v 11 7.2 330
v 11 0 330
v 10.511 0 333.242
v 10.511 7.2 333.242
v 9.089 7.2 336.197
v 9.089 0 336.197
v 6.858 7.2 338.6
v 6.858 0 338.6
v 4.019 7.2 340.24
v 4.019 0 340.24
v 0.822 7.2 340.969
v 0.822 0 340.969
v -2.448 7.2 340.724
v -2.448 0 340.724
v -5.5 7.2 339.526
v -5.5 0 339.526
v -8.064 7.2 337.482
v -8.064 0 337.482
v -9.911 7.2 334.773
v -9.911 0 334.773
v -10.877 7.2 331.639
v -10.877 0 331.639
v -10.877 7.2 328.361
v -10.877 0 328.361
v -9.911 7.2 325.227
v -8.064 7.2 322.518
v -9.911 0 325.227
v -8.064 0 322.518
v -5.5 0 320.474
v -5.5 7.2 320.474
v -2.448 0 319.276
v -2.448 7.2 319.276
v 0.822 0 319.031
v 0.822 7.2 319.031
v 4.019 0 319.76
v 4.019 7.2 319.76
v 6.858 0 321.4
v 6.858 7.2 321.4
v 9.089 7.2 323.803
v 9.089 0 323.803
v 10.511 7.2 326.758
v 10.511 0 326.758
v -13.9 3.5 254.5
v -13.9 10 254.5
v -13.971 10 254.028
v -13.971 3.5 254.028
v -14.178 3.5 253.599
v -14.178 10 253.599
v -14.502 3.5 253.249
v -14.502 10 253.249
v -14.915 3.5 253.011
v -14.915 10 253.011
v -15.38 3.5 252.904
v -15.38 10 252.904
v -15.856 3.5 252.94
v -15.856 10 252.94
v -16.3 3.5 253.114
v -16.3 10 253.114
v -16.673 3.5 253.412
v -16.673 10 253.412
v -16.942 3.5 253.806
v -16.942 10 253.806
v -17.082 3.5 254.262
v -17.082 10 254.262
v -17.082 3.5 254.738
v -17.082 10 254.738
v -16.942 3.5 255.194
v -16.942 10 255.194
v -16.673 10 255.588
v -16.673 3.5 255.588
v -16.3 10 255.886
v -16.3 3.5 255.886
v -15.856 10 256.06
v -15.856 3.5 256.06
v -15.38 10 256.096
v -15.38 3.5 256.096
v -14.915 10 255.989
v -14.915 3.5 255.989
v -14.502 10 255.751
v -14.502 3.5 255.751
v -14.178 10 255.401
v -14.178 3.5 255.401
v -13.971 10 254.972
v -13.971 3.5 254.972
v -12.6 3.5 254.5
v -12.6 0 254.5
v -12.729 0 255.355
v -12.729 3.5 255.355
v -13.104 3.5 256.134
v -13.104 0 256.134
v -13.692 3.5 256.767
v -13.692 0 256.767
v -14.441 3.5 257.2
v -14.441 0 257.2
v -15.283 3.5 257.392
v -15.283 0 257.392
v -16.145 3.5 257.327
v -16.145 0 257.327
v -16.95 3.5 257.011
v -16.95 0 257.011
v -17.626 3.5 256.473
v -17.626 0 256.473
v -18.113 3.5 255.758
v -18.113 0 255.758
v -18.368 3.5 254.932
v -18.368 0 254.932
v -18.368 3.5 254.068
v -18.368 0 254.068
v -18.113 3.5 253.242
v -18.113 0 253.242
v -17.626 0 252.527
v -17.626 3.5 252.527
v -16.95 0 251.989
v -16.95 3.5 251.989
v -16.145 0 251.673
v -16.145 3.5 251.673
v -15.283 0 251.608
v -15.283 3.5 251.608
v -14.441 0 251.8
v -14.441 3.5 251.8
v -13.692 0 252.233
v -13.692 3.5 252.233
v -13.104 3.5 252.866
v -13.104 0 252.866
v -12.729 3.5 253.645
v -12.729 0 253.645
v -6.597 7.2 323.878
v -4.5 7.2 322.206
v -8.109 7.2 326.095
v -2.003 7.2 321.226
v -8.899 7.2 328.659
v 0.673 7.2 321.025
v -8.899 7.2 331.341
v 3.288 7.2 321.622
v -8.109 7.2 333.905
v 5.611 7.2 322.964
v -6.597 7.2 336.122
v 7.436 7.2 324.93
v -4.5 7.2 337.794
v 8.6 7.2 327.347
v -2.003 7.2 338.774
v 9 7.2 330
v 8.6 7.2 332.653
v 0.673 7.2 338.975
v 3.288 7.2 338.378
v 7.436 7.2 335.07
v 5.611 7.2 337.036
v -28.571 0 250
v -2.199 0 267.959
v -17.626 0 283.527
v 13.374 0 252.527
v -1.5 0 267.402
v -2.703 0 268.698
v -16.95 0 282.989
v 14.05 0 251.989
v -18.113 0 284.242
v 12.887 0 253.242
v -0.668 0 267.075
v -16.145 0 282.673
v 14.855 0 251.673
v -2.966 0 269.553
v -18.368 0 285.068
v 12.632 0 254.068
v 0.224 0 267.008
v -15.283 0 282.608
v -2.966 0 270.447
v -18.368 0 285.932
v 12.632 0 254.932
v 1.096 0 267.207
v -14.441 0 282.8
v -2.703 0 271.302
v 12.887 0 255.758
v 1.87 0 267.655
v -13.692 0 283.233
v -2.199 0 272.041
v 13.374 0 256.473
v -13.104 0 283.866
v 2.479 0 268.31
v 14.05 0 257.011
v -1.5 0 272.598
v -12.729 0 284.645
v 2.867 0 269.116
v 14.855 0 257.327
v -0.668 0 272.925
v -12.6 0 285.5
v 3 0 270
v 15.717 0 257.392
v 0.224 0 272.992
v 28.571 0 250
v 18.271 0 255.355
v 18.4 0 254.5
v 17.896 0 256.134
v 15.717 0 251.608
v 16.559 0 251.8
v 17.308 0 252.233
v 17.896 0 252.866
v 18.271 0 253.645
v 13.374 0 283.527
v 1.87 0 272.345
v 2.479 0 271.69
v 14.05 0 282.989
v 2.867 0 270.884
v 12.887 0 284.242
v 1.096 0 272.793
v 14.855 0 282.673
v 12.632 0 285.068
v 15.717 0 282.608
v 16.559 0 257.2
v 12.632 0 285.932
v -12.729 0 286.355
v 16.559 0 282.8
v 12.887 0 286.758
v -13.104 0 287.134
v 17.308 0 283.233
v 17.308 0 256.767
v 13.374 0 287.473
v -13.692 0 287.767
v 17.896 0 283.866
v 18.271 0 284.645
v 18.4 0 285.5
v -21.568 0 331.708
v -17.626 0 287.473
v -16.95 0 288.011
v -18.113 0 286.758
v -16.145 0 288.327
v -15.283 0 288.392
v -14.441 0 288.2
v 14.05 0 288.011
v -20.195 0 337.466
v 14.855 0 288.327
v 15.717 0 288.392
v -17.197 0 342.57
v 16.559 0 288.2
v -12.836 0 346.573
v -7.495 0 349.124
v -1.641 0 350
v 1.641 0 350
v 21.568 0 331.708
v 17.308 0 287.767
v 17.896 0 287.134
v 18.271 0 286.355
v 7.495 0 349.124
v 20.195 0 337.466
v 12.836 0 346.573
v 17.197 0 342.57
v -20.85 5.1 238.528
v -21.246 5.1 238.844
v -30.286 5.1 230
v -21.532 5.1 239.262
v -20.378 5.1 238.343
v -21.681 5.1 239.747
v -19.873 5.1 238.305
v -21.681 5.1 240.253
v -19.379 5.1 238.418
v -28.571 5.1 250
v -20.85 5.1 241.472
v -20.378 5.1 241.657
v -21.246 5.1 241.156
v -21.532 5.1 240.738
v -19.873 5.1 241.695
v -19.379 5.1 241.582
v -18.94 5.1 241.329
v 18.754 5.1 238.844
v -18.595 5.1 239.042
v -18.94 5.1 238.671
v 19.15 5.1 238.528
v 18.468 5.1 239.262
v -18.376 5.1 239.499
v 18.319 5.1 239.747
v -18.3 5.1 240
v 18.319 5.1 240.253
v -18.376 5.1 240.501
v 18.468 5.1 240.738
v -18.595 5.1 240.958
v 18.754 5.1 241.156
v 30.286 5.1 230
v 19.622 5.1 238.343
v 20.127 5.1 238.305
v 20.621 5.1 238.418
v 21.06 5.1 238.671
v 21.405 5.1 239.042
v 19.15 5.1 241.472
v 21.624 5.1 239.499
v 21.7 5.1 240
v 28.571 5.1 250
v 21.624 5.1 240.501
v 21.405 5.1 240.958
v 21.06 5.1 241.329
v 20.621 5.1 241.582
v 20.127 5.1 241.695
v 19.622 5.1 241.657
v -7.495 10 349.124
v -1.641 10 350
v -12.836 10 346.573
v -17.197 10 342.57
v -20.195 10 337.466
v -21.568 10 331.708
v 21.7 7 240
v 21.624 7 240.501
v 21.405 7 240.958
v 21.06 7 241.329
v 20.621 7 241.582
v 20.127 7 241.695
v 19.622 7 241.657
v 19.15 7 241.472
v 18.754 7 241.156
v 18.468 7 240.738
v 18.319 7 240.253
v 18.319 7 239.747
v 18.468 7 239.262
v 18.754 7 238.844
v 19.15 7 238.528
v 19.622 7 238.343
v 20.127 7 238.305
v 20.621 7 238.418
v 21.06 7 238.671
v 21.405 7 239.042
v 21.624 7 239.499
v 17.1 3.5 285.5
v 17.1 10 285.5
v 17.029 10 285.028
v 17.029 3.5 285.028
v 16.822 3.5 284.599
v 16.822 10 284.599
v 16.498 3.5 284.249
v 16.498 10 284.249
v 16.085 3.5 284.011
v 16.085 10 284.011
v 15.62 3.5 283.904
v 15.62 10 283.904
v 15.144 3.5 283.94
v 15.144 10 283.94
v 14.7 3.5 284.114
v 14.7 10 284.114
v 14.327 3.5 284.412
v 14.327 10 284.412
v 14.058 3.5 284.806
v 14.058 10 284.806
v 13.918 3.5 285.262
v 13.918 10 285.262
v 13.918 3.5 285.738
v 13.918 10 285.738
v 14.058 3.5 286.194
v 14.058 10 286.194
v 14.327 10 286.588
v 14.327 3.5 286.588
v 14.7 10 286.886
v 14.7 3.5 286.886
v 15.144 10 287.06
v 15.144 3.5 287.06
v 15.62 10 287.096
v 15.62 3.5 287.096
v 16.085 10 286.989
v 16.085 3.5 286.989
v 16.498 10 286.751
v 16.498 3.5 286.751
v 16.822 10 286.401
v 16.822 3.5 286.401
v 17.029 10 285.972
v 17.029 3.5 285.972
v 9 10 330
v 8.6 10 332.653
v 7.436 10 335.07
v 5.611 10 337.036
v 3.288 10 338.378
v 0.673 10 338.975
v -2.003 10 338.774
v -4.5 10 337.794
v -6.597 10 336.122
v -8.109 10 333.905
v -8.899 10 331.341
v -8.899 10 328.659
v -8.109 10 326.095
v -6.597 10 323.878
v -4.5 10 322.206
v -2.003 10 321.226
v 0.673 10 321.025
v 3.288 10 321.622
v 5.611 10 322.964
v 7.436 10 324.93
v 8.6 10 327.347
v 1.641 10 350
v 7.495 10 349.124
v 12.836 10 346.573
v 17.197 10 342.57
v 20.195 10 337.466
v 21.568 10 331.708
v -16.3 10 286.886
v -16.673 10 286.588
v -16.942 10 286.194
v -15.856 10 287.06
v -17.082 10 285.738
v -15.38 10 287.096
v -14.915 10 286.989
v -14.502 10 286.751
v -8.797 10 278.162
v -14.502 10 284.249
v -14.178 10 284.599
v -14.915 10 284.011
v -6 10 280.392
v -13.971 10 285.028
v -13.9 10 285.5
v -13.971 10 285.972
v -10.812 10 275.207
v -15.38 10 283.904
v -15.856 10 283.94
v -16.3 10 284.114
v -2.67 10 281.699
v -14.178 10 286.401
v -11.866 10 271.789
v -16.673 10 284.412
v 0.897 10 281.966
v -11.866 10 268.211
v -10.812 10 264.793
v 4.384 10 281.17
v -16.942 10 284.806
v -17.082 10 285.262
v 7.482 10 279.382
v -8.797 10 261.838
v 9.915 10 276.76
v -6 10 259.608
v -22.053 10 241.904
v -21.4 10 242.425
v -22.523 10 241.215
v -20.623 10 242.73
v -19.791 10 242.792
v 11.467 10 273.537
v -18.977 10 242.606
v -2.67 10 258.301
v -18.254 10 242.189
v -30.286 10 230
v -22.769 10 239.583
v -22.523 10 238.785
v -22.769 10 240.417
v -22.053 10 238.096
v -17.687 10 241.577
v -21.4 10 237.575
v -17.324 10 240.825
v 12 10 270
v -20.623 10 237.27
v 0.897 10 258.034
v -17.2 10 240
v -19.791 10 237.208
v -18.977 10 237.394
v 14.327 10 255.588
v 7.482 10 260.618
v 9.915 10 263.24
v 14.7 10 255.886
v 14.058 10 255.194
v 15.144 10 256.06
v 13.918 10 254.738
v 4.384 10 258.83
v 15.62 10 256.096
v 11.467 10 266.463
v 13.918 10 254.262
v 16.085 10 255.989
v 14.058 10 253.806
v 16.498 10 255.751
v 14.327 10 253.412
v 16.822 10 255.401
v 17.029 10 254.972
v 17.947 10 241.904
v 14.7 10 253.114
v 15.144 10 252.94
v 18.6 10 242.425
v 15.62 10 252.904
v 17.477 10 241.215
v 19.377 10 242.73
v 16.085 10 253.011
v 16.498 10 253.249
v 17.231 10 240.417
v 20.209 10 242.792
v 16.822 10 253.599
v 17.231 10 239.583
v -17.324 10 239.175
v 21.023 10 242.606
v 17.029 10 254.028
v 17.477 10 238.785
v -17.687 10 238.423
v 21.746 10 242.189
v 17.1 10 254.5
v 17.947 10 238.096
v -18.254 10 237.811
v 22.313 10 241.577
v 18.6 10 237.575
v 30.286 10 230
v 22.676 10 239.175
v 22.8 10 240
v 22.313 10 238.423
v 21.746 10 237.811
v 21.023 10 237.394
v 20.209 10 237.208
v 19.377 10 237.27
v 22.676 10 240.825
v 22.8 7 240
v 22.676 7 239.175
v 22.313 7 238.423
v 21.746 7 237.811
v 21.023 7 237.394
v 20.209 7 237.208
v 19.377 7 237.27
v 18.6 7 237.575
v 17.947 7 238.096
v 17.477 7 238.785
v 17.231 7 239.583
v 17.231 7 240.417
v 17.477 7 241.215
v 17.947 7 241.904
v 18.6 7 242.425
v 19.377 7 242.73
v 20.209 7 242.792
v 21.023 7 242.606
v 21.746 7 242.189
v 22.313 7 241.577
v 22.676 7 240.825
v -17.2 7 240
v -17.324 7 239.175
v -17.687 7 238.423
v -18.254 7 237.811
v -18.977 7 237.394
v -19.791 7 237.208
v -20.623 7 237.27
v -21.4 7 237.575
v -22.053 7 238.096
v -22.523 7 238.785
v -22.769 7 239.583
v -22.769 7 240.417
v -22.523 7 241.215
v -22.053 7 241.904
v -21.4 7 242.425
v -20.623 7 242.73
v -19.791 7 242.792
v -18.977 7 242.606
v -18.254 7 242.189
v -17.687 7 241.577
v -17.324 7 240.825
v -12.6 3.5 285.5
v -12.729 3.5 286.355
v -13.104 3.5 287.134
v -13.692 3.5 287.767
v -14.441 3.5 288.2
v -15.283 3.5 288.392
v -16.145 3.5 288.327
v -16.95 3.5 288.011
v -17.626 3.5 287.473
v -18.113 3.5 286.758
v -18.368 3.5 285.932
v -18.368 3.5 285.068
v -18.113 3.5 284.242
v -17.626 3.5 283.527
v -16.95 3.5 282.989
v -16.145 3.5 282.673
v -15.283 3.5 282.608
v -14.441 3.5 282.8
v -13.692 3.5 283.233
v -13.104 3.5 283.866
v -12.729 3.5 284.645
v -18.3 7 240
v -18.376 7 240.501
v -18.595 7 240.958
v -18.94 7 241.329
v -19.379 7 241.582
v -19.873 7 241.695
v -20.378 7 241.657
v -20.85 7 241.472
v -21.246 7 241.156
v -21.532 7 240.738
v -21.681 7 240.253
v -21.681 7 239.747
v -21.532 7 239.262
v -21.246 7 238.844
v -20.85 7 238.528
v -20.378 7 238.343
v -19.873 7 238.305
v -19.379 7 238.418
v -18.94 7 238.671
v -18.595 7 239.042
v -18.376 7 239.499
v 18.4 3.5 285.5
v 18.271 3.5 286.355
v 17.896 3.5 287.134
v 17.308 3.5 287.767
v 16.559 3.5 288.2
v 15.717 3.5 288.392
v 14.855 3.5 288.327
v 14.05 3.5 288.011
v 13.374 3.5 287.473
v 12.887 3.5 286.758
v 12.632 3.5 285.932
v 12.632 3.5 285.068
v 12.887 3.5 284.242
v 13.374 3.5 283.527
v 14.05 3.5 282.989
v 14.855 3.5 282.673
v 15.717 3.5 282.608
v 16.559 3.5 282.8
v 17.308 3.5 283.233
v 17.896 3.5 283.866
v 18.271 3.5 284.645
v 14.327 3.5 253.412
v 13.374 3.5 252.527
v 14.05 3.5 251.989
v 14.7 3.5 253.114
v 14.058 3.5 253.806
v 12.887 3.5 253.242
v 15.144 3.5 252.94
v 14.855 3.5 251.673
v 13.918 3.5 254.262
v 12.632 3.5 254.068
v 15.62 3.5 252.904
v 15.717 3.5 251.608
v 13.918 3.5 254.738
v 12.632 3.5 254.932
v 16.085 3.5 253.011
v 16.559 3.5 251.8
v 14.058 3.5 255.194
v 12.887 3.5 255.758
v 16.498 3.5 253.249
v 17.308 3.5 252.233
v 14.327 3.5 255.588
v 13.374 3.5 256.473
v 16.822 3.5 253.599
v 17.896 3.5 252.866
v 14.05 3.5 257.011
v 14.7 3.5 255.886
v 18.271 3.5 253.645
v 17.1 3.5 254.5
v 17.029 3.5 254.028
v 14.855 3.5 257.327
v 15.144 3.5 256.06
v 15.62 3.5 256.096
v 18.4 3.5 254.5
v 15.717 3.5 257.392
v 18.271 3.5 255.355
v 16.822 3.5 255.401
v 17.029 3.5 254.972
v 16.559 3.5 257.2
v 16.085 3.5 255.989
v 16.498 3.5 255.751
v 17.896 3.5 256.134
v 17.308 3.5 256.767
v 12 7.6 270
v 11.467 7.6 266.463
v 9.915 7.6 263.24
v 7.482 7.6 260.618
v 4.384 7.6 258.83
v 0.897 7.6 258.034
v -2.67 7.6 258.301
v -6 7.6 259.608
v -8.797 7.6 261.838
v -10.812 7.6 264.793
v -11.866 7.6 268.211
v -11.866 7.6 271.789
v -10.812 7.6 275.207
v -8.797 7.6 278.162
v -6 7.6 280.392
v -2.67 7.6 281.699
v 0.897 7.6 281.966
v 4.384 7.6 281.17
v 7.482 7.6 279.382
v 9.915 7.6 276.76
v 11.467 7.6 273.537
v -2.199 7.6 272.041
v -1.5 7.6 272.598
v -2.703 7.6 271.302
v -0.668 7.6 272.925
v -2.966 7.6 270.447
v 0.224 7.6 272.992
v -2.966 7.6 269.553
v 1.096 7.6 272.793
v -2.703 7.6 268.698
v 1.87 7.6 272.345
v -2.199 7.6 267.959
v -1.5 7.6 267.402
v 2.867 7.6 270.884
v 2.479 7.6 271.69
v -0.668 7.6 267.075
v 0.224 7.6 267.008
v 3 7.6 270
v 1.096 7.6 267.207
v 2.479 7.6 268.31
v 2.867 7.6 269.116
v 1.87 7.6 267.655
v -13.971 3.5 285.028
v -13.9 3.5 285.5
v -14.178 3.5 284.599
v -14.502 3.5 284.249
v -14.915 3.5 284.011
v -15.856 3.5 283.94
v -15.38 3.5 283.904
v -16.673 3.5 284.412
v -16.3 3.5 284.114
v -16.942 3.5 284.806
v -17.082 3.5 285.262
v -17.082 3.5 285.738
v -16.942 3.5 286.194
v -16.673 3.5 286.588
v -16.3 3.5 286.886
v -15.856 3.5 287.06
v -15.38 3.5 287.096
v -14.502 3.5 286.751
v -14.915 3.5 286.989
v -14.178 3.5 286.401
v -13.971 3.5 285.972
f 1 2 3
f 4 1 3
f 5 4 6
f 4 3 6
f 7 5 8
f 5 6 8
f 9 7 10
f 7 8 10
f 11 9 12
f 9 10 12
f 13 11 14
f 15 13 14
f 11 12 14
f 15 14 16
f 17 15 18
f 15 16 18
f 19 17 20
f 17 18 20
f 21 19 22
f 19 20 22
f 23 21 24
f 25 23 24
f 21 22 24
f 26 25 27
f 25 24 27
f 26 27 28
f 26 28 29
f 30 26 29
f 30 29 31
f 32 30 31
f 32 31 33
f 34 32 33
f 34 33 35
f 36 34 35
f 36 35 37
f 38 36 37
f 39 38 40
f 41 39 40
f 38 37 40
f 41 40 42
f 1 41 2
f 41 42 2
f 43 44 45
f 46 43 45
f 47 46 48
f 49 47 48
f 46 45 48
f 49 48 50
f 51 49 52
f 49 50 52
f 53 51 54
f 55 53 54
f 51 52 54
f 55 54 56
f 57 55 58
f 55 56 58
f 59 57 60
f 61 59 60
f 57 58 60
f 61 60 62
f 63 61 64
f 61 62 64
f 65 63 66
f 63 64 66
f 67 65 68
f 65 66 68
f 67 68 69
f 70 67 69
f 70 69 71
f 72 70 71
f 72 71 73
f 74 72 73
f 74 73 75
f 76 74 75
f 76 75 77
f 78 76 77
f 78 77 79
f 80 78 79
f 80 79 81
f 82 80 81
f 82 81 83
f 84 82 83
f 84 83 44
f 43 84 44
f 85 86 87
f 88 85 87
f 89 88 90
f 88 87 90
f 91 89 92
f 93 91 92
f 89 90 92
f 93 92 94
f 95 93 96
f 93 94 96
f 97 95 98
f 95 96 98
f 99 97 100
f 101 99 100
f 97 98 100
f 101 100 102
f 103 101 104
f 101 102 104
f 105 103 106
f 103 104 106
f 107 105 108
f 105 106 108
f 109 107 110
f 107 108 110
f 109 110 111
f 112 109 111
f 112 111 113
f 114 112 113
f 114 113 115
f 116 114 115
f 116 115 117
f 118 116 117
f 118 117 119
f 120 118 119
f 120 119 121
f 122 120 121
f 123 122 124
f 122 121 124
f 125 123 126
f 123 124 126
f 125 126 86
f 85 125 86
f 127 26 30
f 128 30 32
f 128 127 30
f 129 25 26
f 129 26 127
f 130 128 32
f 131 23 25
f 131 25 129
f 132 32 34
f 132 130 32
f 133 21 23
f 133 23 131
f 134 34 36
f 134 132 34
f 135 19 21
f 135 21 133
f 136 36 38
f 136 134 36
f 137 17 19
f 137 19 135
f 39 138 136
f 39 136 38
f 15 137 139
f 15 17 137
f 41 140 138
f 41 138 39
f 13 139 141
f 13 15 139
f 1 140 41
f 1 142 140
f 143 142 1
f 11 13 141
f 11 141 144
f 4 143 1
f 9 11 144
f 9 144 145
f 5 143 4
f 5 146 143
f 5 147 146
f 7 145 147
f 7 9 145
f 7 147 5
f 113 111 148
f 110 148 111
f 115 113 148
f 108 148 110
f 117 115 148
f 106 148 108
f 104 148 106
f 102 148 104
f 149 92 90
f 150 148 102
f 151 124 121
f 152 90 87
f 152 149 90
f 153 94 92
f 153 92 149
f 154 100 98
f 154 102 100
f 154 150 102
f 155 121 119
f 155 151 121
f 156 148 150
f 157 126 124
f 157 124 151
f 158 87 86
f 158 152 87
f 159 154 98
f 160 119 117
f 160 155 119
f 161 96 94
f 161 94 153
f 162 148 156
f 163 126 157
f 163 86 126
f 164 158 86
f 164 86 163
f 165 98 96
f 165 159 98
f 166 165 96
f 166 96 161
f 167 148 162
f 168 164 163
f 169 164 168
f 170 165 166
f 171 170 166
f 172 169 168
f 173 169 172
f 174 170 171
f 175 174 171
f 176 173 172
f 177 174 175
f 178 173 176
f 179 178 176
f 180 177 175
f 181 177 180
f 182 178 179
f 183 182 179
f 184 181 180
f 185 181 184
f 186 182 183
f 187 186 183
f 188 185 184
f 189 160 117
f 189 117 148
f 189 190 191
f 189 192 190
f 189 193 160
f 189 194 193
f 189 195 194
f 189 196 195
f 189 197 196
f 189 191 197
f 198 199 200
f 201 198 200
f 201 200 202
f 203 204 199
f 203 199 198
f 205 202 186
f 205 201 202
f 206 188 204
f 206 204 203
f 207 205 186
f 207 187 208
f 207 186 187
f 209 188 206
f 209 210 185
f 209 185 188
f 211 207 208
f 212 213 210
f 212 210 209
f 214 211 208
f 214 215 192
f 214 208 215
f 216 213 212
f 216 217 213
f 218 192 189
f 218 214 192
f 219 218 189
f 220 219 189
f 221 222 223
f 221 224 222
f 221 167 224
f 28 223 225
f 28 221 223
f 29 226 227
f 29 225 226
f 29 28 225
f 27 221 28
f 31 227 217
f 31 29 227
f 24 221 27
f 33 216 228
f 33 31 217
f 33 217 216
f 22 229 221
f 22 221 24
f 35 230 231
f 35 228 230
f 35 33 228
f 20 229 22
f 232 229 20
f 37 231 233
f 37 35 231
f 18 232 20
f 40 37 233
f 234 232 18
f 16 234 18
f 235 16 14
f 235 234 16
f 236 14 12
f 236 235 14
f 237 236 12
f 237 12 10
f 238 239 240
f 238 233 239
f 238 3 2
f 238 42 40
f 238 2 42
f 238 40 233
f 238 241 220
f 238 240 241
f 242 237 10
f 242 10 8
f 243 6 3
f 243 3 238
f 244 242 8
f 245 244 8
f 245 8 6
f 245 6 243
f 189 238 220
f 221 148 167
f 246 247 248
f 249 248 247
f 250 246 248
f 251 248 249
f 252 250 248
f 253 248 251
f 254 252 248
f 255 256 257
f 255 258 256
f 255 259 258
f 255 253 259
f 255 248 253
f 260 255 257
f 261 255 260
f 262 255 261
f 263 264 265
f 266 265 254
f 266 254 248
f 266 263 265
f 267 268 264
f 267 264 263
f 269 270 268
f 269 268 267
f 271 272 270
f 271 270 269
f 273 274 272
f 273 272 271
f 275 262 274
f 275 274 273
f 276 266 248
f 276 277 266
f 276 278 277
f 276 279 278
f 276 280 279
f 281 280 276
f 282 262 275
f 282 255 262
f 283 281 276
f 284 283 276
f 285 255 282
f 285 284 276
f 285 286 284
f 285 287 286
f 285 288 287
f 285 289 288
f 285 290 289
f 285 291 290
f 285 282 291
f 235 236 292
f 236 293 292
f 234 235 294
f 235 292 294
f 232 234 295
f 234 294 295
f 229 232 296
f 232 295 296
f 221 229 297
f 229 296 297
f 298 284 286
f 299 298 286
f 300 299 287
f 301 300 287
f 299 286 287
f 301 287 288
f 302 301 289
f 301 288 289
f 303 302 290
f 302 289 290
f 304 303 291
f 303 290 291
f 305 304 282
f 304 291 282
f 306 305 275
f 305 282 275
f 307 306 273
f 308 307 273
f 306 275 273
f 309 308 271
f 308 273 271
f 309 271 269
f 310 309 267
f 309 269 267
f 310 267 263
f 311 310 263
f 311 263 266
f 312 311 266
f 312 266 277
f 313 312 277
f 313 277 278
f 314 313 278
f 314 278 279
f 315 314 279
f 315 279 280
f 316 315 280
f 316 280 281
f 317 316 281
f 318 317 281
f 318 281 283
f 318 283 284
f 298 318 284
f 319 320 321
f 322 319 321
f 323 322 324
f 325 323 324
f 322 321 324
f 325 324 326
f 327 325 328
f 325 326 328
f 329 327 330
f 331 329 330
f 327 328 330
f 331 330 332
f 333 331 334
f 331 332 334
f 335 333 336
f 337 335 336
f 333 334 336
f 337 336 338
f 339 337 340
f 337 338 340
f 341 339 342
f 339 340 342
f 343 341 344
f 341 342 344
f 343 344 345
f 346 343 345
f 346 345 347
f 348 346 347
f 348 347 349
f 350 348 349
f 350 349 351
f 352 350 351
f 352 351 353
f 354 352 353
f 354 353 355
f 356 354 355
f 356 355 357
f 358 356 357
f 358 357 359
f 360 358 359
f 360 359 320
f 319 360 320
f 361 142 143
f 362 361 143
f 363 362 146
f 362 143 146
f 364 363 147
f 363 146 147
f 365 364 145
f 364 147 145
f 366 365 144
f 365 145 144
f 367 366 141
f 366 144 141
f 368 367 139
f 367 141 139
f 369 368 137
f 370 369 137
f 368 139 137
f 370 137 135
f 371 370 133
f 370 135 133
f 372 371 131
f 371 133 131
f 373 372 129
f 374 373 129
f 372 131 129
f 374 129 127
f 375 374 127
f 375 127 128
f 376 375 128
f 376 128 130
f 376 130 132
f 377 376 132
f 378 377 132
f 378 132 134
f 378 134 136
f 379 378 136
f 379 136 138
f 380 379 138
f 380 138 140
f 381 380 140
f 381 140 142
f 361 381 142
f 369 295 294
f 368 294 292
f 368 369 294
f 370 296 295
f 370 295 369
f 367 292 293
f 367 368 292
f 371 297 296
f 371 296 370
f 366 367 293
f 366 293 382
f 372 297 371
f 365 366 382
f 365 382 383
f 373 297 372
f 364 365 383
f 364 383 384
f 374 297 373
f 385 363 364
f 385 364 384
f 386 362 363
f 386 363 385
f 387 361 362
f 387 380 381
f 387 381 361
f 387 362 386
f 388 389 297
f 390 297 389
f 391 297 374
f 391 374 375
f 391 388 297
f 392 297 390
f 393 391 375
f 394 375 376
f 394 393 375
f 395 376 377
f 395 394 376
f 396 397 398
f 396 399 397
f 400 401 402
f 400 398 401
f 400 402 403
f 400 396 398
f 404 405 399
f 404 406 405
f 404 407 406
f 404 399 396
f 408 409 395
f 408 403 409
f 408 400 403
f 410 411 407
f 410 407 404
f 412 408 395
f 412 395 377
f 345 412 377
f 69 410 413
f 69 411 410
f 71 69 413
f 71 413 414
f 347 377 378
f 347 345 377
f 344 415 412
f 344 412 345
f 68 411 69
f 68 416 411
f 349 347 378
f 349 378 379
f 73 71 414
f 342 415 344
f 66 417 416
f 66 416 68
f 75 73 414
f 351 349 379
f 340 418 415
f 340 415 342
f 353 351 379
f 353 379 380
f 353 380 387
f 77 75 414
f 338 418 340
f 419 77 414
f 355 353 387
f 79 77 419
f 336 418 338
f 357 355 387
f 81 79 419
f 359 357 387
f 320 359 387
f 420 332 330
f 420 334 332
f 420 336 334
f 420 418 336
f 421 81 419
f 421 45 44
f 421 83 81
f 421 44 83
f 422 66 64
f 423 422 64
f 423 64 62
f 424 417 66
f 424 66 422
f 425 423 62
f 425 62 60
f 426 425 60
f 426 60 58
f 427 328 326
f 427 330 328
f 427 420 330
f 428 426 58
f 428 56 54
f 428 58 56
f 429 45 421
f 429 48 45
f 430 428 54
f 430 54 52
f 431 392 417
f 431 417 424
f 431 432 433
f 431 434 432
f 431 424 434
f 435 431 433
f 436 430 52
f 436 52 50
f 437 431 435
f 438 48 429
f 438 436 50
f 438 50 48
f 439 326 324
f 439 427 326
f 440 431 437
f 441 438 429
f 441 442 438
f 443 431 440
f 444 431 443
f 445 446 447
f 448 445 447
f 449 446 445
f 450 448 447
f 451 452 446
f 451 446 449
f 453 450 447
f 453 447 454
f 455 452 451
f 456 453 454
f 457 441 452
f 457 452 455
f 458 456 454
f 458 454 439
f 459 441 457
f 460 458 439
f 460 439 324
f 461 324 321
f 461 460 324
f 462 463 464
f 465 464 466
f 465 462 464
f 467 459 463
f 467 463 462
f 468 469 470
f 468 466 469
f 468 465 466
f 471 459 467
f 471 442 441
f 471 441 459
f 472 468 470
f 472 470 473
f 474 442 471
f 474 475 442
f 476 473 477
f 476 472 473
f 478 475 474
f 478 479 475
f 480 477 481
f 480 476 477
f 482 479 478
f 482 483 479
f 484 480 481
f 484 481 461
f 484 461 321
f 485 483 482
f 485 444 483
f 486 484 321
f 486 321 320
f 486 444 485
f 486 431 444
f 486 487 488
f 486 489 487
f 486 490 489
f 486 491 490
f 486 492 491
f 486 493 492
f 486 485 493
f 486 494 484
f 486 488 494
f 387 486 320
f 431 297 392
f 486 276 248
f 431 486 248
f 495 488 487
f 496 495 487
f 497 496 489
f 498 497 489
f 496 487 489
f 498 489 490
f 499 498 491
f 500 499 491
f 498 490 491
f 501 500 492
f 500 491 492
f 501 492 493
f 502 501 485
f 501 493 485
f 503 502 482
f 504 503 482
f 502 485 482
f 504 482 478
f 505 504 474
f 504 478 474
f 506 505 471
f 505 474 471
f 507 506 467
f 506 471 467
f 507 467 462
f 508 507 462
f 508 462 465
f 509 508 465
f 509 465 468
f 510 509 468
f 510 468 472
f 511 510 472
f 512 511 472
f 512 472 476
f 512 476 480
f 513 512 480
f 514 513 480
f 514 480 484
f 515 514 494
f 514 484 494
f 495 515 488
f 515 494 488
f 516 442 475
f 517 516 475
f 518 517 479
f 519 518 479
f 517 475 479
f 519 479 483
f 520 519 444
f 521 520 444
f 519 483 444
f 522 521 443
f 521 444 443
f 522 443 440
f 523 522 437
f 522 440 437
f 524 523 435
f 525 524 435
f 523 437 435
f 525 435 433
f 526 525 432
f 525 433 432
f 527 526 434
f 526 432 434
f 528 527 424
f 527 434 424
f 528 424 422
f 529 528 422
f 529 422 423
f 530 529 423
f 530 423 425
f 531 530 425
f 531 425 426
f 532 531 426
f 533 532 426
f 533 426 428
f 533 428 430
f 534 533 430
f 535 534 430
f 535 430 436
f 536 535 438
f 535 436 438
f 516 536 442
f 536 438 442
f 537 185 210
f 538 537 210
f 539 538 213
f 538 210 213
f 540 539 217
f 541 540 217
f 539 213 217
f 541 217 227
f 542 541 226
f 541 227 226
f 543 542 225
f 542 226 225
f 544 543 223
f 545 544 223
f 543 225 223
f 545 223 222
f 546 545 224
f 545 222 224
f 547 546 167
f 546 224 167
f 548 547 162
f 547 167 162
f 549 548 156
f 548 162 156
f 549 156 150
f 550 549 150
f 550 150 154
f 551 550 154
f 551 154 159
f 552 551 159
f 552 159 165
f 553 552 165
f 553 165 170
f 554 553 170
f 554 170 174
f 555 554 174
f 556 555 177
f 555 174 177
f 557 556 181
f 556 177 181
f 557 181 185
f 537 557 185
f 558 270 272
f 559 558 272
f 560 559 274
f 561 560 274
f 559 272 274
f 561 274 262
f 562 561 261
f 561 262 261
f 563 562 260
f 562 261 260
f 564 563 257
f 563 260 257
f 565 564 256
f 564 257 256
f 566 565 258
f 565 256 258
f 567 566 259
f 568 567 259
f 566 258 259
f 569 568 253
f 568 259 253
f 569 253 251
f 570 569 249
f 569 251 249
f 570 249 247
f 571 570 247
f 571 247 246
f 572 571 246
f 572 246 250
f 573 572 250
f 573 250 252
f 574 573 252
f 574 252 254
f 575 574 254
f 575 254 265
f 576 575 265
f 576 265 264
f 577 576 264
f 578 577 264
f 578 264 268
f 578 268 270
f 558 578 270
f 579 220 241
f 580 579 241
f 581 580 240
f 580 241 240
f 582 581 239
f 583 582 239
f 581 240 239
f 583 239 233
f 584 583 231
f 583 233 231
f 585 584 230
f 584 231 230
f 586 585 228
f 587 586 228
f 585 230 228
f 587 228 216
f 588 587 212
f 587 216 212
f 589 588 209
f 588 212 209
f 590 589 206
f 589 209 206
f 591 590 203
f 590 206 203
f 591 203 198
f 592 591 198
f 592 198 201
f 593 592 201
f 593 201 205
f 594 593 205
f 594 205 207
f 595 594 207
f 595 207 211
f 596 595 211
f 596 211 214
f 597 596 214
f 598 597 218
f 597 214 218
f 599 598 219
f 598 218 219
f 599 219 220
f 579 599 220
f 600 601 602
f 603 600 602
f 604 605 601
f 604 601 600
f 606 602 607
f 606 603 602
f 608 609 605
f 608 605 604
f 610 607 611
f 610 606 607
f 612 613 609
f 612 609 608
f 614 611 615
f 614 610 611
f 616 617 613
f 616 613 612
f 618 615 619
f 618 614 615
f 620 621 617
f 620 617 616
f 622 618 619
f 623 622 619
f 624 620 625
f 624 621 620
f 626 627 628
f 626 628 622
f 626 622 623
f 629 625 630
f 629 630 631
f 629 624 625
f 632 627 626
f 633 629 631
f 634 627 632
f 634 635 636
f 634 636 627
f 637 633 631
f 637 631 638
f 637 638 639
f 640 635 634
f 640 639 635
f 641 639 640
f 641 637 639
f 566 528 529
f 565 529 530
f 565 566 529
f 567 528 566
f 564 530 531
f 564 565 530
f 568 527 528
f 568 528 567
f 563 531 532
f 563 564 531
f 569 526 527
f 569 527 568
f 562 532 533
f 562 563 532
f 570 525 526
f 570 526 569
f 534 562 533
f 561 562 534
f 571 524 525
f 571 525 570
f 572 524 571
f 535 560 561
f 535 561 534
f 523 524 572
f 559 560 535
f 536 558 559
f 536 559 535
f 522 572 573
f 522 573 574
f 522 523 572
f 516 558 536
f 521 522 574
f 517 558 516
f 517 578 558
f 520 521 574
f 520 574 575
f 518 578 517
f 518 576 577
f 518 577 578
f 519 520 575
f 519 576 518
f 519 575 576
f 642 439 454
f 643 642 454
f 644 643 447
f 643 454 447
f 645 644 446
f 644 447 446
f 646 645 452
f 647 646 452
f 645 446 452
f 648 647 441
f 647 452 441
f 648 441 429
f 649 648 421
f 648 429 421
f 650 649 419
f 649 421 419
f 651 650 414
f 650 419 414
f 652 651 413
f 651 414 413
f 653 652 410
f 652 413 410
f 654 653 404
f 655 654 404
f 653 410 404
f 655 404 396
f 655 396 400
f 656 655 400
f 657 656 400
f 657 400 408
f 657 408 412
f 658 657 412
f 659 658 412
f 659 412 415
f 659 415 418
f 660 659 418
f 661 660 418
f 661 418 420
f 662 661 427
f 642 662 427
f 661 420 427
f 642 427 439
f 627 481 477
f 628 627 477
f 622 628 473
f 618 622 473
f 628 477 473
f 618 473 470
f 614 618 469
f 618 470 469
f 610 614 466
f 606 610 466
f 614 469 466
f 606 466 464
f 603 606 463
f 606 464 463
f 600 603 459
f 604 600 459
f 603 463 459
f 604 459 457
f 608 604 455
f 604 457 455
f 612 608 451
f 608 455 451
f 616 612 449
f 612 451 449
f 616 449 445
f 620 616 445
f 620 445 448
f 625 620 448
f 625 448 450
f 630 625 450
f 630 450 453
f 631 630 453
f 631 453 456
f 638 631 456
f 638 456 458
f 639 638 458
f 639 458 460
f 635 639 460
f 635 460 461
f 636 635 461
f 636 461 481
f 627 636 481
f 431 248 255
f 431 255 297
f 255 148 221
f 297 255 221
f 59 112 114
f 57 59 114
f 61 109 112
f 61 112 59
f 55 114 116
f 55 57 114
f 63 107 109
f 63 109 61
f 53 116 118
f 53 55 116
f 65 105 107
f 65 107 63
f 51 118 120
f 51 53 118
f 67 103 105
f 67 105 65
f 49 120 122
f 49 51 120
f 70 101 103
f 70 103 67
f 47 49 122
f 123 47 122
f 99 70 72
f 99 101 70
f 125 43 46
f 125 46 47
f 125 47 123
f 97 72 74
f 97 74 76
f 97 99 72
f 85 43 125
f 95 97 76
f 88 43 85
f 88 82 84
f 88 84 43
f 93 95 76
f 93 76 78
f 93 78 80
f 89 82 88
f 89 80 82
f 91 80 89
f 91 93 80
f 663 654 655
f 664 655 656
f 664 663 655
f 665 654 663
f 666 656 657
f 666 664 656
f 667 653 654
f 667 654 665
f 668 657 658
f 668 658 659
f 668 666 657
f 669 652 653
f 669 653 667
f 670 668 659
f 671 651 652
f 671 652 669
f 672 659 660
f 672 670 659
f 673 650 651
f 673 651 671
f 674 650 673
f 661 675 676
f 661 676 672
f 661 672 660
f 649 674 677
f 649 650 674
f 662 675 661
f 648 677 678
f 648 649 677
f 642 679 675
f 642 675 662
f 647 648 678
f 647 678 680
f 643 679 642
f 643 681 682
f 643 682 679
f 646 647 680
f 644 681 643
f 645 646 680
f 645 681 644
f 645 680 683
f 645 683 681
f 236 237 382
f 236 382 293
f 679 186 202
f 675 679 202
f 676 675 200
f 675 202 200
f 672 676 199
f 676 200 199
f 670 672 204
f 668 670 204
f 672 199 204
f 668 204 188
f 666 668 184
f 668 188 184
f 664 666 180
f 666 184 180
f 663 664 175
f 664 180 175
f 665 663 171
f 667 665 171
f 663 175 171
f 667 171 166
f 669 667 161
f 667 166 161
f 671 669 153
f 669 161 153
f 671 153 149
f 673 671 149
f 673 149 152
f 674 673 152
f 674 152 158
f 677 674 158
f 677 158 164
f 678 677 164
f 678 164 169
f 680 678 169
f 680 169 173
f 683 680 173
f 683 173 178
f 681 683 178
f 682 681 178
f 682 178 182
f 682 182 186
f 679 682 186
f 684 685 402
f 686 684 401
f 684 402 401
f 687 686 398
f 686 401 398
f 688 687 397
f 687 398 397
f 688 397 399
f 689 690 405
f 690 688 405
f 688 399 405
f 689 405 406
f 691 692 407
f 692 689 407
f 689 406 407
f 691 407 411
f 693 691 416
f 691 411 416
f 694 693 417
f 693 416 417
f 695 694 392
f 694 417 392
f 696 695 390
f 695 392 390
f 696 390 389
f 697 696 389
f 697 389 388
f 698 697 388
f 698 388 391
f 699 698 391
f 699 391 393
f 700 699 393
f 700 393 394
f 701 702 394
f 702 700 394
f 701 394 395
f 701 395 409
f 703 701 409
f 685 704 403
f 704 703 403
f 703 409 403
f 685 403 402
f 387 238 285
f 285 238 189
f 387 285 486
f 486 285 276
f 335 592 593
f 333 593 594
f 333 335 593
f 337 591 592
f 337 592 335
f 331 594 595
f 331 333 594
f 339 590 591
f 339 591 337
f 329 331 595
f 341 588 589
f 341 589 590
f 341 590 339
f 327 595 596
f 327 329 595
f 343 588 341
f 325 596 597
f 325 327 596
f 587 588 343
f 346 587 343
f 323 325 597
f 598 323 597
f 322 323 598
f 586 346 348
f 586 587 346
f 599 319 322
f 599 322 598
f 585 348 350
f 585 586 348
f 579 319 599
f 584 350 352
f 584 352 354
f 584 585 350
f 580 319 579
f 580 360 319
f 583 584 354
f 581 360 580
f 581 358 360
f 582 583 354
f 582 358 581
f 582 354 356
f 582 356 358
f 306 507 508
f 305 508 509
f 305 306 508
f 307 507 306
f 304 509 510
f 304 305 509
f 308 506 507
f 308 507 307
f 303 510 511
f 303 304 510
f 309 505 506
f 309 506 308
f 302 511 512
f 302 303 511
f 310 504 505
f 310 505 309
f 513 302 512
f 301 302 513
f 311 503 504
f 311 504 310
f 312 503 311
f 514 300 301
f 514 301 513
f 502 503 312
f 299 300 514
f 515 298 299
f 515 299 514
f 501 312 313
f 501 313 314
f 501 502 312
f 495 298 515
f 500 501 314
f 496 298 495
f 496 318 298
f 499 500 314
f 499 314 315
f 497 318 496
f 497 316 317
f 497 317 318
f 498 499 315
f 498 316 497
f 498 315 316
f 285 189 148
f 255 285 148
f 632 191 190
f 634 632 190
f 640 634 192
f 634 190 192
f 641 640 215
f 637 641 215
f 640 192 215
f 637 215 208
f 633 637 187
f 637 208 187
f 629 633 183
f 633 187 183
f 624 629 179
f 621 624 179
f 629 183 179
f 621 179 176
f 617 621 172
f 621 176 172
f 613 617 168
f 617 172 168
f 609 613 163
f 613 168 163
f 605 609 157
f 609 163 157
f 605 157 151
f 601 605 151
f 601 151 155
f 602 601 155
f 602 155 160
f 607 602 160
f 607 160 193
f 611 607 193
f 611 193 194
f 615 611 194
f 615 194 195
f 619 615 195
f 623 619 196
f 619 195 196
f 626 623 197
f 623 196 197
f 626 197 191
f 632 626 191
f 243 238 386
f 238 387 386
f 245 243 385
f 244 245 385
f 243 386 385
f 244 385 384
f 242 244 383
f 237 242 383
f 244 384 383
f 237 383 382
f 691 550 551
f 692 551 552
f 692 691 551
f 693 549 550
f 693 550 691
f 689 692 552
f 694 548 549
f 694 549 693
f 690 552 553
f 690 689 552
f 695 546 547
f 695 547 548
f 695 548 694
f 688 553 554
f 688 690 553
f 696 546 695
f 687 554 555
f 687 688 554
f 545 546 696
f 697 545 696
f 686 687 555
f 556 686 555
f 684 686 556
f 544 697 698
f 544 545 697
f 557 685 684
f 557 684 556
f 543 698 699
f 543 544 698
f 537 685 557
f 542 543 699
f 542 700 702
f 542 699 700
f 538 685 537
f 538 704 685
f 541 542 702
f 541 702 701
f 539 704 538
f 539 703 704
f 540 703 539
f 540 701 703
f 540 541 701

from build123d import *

# Parameters (mm, degrees)
SKETCH1_R           = 50
BOSS_EXTRUDE1_DEPTH = 10
SKETCH2_R           = 20
CUT_EXTRUDE1_DEPTH  = 5
CUT_EXTRUDE6_DEPTH  = 3
SKETCH8_R           = 1.7
CUT_EXTRUDE7_DEPTH  = 10
BOSS_EXTRUDE3_DEPTH = 10
CUT_EXTRUDE11_DEPTH = 10
SKETCH15_W          = 131.735170003
SKETCH15_H          = 179.266555965
CUT_EXTRUDE12_DEPTH = 79
BOSS_EXTRUDE4_DEPTH = 4.9
SKETCH17_R          = 1.7
CUT_EXTRUDE13_DEPTH = 10
CUT_EXTRUDE14_DEPTH = 3
SKETCH19_W          = 78.571428572
SKETCH19_H          = 5.1
CUT_EXTRUDE15_DEPTH = 0.5
SKETCH21_W          = 92.115977302
SKETCH21_H          = 140.887390287
CUT_EXTRUDE16_DEPTH = 10
CUT_EXTRUDE17_DEPTH = 5.1
SKETCH24_R          = 1.7
CUT_EXTRUDE19_DEPTH = 5.1
SKETCH25_R          = 11
CUT_EXTRUDE20_DEPTH = 7.2
SKETCH26_R          = 9
CUT_EXTRUDE21_DEPTH = 7.2
SKETCH27_R          = 3
CUT_EXTRUDE22_DEPTH = 11
SKETCH28_R          = 1.6
CUT_EXTRUDE23_DEPTH = 12
SKETCH29_R          = 2.9
SKETCH29_R_2        = 1.6
CUT_EXTRUDE24_DEPTH = 3.5
SKETCH30_R          = 12
CUT_EXTRUDE25_DEPTH = 2.4
SKETCH31_R          = 2.8
CUT_EXTRUDE26_DEPTH = 3
FILLET1_R           = 20


with BuildPart() as part:
    # Sketch1 → Boss-Extrude1 (new body)
    with BuildSketch(Plane(origin=(0, 0, 0), x_dir=(1, 0, 0), z_dir=(0, 1, 0))):
        Circle(SKETCH1_R)
    extrude(amount=BOSS_EXTRUDE1_DEPTH)

    # Sketch2 → Cut-Extrude1 (cut)
    with BuildSketch(Plane(origin=(0, 10, 0), x_dir=(1, 0, 0), z_dir=(0, 1, 0))):
        Circle(SKETCH2_R)
    extrude(amount=-CUT_EXTRUDE1_DEPTH, mode=Mode.SUBTRACT)

    # Sketch7 → Cut-Extrude6 (cut)
    with BuildSketch(Plane.XZ):
        Polygon((12.990381057, -4.209103466), (10.140381057, -5.854551733), (10.140381057, -9.145448267), (12.990381057, -10.790896534), (15.840381057, -9.145448267), (15.840381057, -5.854551733), align=None)
        Polygon((-12.990381057, -4.209103466), (-15.840381057, -5.854551733), (-15.840381057, -9.145448267), (-12.990381057, -10.790896534), (-10.140381057, -9.145448267), (-10.140381057, -5.854551733), align=None)
        Polygon((-2.85, 16.645448267), (-2.85, 13.354551733), (0, 11.709103466), (2.85, 13.354551733), (2.85, 16.645448267), (0, 18.290896534), align=None)
    extrude(amount=-CUT_EXTRUDE6_DEPTH, mode=Mode.SUBTRACT)

    # Sketch8 → Cut-Extrude7 (cut)
    with BuildSketch(Plane.XZ):
        with Locations((0, 15)):
            Circle(SKETCH8_R)
        with Locations((12.990381057, -7.5)):
            Circle(SKETCH8_R)
        with Locations((-12.990381057, -7.5)):
            Circle(SKETCH8_R)
    extrude(amount=-CUT_EXTRUDE7_DEPTH, mode=Mode.SUBTRACT)


with BuildPart() as body_2:
    # Sketch9 → Boss-Extrude3 (new body)
    with BuildSketch(Plane.XZ):
        with BuildLine():
            Line((-50, 350), (-50, 0))
            ThreePointArc((-50, 0), (0, 50), (50, 0))
            Line((50, 0), (50, 350))
            Line((50, 350), (-50, 350))
        make_face()
    extrude(amount=-BOSS_EXTRUDE3_DEPTH)

    # Sketch13 → Cut-Extrude11 (cut)
    with BuildSketch(Plane.XZ):
        with BuildLine():
            Line((-50, 350), (-50, 0))
            ThreePointArc((-50, 0), (-49.817332452, 4.270057067), (-49.270664506, 8.5089141))
            Line((-49.270664506, 8.5089141), (-20, 350))
            Line((-20, 350), (-50, 350))
        make_face()
        with BuildLine():
            Line((20, 350), (49.270664506, 8.5089141))
            ThreePointArc((49.270664506, 8.5089141), (49.817332452, 4.270057067), (50, 0))
            Line((50, 0), (50, 350))
            Line((50, 350), (20, 350))
        make_face()
    extrude(amount=-CUT_EXTRUDE11_DEPTH, mode=Mode.SUBTRACT)


with BuildPart() as cut_extrude12_tool:
    # Sketch15 → Cut-Extrude12 (new body)
    with BuildSketch(Plane(origin=(0, 10, 0), x_dir=(1, 0, 0), z_dir=(0, 1, 0))):
        with Locations((-8.166136658, -35.366722018)):
            Rectangle(SKETCH15_W, SKETCH15_H)
    extrude(amount=-CUT_EXTRUDE12_DEPTH)


with BuildPart() as part_1:
    add(part.part)

    # Cut-Extrude12: cut by cut_extrude12_tool
    add(cut_extrude12_tool.part, mode=Mode.SUBTRACT)


with BuildPart() as body_2_1:
    add(body_2.part)

    # Cut-Extrude12: cut by cut_extrude12_tool
    add(cut_extrude12_tool.part, mode=Mode.SUBTRACT)

    # Sketch16 → Boss-Extrude4 (add)
    with BuildSketch(Plane(origin=(0, 10, 0), x_dir=(1, 0, 0), z_dir=(0, 1, 0))):
        Polygon((40.972386827, -105.322153681), (-40.972386827, -105.322153681), (-39.285714286, -125), (39.285714286, -125), align=None)
    extrude(amount=-BOSS_EXTRUDE4_DEPTH)

    # Sketch17 → Cut-Extrude13 (cut)
    with BuildSketch(Plane.XZ.offset(-5.1)):
        with Locations((-25, 115)):
            Circle(SKETCH17_R)
        with Locations((25, 115)):
            Circle(SKETCH17_R)
    extrude(amount=-CUT_EXTRUDE13_DEPTH, mode=Mode.SUBTRACT)

    # Sketch18 → Cut-Extrude14 (cut)
    with BuildSketch(Plane(origin=(0, 10, 0), x_dir=(1, 0, 0), z_dir=(0, 1, 0))):
        Polygon((-25, -111.651368439), (-27.9, -113.325684219), (-27.9, -116.674315781), (-25, -118.348631561), (-22.1, -116.674315781), (-22.1, -113.325684219), align=None)
        Polygon((22.1, -113.325684219), (25, -111.651368439), (27.9, -113.325684219), (27.9, -116.674315781), (25, -118.348631561), (22.1, -116.674315781), align=None)
    extrude(amount=-CUT_EXTRUDE14_DEPTH, mode=Mode.SUBTRACT)

    # Sketch19 → Cut-Extrude15 (cut)
    with BuildSketch(Plane(origin=(0, 0, 125), x_dir=(-1, 0, 0), z_dir=(0, 0, -1))):
        with Locations((0, 2.55)):
            Rectangle(SKETCH19_W, SKETCH19_H)
    extrude(amount=-CUT_EXTRUDE15_DEPTH, mode=Mode.SUBTRACT)

    # Sketch21 → Cut-Extrude16 (cut)
    with BuildSketch(Plane.XZ):
        with Locations((0.437891513, 159.556304857)):
            Rectangle(SKETCH21_W, SKETCH21_H)
    extrude(amount=-CUT_EXTRUDE16_DEPTH, mode=Mode.SUBTRACT)

    # Sketch21<3> → Cut-Extrude17 (cut)
    with BuildSketch(Plane.XZ):
        Polygon((-28.571428571, 250), (-30.285714286, 230), (30.285714286, 230), (28.571428571, 250), align=None)
    extrude(amount=-CUT_EXTRUDE17_DEPTH, mode=Mode.SUBTRACT)

    # Sketch24 → Cut-Extrude19 (cut)
    with BuildSketch(Plane.XZ.offset(-5.1)):
        with Locations((20, 240)):
            Circle(SKETCH24_R)
        with Locations((-20, 240)):
            Circle(SKETCH24_R)
    extrude(amount=-CUT_EXTRUDE19_DEPTH, mode=Mode.SUBTRACT)

    # Sketch25 → Cut-Extrude20 (cut)
    with BuildSketch(Plane.XZ):
        with Locations((0, 330)):
            Circle(SKETCH25_R)
    extrude(amount=-CUT_EXTRUDE20_DEPTH, mode=Mode.SUBTRACT)

    # Sketch26 → Cut-Extrude21 (cut)
    with BuildSketch(Plane.XZ.offset(-7.2)):
        with Locations((0, 330)):
            Circle(SKETCH26_R)
    extrude(amount=-CUT_EXTRUDE21_DEPTH, mode=Mode.SUBTRACT)

    # Sketch27 → Cut-Extrude22 (cut)
    with BuildSketch(Plane.XZ):
        with Locations((0, 270)):
            Circle(SKETCH27_R)
    extrude(amount=-CUT_EXTRUDE22_DEPTH, mode=Mode.SUBTRACT)

    # Sketch28 → Cut-Extrude23 (cut)
    with BuildSketch(Plane(origin=(0, 10, 0), x_dir=(1, 0, 0), z_dir=(0, 1, 0))):
        with Locations((-15.5, -254.5)):
            Circle(SKETCH28_R)
        with Locations((15.5, -254.5)):
            Circle(SKETCH28_R)
        with Locations((15.5, -285.5)):
            Circle(SKETCH28_R)
        with Locations((-15.5, -285.5)):
            Circle(SKETCH28_R)
    extrude(amount=-CUT_EXTRUDE23_DEPTH, mode=Mode.SUBTRACT)

    # Sketch29 → Cut-Extrude24 (cut)
    # profile 1 of 4: a face of its own
    with BuildSketch(Plane.XZ):
        with Locations((-15.5, 285.5)):
            Circle(SKETCH29_R)
        with Locations((-15.5, 285.5)):
            Circle(SKETCH29_R_2, mode=Mode.SUBTRACT)
    # profile 2 of 4: a face of its own
    with BuildSketch(Plane.XZ):
        with Locations((15.5, 285.5)):
            Circle(SKETCH29_R)
    # profile 3 of 4: a face of its own
    with BuildSketch(Plane.XZ):
        with Locations((15.5, 254.5)):
            Circle(SKETCH29_R)
    # profile 4 of 4: a face of its own
    with BuildSketch(Plane.XZ):
        with Locations((-15.5, 254.5)):
            Circle(SKETCH29_R)
    extrude(amount=-CUT_EXTRUDE24_DEPTH, mode=Mode.SUBTRACT)

    # Sketch30 → Cut-Extrude25 (cut)
    with BuildSketch(Plane(origin=(0, 10, 0), x_dir=(1, 0, 0), z_dir=(0, 1, 0))):
        with Locations((0, -270)):
            Circle(SKETCH30_R)
    extrude(amount=-CUT_EXTRUDE25_DEPTH, mode=Mode.SUBTRACT)

    # Sketch31 → Cut-Extrude26 (cut)
    with BuildSketch(Plane(origin=(0, 10, 0), x_dir=(1, 0, 0), z_dir=(0, 1, 0))):
        with Locations((-20, -240)):
            Circle(SKETCH31_R)
        with Locations((20, -240)):
            Circle(SKETCH31_R)
    extrude(amount=-CUT_EXTRUDE26_DEPTH, mode=Mode.SUBTRACT)

    # Fillet1
    fillet1_edges = [body_2_1.edges().sort_by_distance(p)[0] for p in [
        (-20, 5, 350),
        (20, 5, 350),
    ]]
    fillet(fillet1_edges, radius=FILLET1_R)


solid = body_2_1.part
